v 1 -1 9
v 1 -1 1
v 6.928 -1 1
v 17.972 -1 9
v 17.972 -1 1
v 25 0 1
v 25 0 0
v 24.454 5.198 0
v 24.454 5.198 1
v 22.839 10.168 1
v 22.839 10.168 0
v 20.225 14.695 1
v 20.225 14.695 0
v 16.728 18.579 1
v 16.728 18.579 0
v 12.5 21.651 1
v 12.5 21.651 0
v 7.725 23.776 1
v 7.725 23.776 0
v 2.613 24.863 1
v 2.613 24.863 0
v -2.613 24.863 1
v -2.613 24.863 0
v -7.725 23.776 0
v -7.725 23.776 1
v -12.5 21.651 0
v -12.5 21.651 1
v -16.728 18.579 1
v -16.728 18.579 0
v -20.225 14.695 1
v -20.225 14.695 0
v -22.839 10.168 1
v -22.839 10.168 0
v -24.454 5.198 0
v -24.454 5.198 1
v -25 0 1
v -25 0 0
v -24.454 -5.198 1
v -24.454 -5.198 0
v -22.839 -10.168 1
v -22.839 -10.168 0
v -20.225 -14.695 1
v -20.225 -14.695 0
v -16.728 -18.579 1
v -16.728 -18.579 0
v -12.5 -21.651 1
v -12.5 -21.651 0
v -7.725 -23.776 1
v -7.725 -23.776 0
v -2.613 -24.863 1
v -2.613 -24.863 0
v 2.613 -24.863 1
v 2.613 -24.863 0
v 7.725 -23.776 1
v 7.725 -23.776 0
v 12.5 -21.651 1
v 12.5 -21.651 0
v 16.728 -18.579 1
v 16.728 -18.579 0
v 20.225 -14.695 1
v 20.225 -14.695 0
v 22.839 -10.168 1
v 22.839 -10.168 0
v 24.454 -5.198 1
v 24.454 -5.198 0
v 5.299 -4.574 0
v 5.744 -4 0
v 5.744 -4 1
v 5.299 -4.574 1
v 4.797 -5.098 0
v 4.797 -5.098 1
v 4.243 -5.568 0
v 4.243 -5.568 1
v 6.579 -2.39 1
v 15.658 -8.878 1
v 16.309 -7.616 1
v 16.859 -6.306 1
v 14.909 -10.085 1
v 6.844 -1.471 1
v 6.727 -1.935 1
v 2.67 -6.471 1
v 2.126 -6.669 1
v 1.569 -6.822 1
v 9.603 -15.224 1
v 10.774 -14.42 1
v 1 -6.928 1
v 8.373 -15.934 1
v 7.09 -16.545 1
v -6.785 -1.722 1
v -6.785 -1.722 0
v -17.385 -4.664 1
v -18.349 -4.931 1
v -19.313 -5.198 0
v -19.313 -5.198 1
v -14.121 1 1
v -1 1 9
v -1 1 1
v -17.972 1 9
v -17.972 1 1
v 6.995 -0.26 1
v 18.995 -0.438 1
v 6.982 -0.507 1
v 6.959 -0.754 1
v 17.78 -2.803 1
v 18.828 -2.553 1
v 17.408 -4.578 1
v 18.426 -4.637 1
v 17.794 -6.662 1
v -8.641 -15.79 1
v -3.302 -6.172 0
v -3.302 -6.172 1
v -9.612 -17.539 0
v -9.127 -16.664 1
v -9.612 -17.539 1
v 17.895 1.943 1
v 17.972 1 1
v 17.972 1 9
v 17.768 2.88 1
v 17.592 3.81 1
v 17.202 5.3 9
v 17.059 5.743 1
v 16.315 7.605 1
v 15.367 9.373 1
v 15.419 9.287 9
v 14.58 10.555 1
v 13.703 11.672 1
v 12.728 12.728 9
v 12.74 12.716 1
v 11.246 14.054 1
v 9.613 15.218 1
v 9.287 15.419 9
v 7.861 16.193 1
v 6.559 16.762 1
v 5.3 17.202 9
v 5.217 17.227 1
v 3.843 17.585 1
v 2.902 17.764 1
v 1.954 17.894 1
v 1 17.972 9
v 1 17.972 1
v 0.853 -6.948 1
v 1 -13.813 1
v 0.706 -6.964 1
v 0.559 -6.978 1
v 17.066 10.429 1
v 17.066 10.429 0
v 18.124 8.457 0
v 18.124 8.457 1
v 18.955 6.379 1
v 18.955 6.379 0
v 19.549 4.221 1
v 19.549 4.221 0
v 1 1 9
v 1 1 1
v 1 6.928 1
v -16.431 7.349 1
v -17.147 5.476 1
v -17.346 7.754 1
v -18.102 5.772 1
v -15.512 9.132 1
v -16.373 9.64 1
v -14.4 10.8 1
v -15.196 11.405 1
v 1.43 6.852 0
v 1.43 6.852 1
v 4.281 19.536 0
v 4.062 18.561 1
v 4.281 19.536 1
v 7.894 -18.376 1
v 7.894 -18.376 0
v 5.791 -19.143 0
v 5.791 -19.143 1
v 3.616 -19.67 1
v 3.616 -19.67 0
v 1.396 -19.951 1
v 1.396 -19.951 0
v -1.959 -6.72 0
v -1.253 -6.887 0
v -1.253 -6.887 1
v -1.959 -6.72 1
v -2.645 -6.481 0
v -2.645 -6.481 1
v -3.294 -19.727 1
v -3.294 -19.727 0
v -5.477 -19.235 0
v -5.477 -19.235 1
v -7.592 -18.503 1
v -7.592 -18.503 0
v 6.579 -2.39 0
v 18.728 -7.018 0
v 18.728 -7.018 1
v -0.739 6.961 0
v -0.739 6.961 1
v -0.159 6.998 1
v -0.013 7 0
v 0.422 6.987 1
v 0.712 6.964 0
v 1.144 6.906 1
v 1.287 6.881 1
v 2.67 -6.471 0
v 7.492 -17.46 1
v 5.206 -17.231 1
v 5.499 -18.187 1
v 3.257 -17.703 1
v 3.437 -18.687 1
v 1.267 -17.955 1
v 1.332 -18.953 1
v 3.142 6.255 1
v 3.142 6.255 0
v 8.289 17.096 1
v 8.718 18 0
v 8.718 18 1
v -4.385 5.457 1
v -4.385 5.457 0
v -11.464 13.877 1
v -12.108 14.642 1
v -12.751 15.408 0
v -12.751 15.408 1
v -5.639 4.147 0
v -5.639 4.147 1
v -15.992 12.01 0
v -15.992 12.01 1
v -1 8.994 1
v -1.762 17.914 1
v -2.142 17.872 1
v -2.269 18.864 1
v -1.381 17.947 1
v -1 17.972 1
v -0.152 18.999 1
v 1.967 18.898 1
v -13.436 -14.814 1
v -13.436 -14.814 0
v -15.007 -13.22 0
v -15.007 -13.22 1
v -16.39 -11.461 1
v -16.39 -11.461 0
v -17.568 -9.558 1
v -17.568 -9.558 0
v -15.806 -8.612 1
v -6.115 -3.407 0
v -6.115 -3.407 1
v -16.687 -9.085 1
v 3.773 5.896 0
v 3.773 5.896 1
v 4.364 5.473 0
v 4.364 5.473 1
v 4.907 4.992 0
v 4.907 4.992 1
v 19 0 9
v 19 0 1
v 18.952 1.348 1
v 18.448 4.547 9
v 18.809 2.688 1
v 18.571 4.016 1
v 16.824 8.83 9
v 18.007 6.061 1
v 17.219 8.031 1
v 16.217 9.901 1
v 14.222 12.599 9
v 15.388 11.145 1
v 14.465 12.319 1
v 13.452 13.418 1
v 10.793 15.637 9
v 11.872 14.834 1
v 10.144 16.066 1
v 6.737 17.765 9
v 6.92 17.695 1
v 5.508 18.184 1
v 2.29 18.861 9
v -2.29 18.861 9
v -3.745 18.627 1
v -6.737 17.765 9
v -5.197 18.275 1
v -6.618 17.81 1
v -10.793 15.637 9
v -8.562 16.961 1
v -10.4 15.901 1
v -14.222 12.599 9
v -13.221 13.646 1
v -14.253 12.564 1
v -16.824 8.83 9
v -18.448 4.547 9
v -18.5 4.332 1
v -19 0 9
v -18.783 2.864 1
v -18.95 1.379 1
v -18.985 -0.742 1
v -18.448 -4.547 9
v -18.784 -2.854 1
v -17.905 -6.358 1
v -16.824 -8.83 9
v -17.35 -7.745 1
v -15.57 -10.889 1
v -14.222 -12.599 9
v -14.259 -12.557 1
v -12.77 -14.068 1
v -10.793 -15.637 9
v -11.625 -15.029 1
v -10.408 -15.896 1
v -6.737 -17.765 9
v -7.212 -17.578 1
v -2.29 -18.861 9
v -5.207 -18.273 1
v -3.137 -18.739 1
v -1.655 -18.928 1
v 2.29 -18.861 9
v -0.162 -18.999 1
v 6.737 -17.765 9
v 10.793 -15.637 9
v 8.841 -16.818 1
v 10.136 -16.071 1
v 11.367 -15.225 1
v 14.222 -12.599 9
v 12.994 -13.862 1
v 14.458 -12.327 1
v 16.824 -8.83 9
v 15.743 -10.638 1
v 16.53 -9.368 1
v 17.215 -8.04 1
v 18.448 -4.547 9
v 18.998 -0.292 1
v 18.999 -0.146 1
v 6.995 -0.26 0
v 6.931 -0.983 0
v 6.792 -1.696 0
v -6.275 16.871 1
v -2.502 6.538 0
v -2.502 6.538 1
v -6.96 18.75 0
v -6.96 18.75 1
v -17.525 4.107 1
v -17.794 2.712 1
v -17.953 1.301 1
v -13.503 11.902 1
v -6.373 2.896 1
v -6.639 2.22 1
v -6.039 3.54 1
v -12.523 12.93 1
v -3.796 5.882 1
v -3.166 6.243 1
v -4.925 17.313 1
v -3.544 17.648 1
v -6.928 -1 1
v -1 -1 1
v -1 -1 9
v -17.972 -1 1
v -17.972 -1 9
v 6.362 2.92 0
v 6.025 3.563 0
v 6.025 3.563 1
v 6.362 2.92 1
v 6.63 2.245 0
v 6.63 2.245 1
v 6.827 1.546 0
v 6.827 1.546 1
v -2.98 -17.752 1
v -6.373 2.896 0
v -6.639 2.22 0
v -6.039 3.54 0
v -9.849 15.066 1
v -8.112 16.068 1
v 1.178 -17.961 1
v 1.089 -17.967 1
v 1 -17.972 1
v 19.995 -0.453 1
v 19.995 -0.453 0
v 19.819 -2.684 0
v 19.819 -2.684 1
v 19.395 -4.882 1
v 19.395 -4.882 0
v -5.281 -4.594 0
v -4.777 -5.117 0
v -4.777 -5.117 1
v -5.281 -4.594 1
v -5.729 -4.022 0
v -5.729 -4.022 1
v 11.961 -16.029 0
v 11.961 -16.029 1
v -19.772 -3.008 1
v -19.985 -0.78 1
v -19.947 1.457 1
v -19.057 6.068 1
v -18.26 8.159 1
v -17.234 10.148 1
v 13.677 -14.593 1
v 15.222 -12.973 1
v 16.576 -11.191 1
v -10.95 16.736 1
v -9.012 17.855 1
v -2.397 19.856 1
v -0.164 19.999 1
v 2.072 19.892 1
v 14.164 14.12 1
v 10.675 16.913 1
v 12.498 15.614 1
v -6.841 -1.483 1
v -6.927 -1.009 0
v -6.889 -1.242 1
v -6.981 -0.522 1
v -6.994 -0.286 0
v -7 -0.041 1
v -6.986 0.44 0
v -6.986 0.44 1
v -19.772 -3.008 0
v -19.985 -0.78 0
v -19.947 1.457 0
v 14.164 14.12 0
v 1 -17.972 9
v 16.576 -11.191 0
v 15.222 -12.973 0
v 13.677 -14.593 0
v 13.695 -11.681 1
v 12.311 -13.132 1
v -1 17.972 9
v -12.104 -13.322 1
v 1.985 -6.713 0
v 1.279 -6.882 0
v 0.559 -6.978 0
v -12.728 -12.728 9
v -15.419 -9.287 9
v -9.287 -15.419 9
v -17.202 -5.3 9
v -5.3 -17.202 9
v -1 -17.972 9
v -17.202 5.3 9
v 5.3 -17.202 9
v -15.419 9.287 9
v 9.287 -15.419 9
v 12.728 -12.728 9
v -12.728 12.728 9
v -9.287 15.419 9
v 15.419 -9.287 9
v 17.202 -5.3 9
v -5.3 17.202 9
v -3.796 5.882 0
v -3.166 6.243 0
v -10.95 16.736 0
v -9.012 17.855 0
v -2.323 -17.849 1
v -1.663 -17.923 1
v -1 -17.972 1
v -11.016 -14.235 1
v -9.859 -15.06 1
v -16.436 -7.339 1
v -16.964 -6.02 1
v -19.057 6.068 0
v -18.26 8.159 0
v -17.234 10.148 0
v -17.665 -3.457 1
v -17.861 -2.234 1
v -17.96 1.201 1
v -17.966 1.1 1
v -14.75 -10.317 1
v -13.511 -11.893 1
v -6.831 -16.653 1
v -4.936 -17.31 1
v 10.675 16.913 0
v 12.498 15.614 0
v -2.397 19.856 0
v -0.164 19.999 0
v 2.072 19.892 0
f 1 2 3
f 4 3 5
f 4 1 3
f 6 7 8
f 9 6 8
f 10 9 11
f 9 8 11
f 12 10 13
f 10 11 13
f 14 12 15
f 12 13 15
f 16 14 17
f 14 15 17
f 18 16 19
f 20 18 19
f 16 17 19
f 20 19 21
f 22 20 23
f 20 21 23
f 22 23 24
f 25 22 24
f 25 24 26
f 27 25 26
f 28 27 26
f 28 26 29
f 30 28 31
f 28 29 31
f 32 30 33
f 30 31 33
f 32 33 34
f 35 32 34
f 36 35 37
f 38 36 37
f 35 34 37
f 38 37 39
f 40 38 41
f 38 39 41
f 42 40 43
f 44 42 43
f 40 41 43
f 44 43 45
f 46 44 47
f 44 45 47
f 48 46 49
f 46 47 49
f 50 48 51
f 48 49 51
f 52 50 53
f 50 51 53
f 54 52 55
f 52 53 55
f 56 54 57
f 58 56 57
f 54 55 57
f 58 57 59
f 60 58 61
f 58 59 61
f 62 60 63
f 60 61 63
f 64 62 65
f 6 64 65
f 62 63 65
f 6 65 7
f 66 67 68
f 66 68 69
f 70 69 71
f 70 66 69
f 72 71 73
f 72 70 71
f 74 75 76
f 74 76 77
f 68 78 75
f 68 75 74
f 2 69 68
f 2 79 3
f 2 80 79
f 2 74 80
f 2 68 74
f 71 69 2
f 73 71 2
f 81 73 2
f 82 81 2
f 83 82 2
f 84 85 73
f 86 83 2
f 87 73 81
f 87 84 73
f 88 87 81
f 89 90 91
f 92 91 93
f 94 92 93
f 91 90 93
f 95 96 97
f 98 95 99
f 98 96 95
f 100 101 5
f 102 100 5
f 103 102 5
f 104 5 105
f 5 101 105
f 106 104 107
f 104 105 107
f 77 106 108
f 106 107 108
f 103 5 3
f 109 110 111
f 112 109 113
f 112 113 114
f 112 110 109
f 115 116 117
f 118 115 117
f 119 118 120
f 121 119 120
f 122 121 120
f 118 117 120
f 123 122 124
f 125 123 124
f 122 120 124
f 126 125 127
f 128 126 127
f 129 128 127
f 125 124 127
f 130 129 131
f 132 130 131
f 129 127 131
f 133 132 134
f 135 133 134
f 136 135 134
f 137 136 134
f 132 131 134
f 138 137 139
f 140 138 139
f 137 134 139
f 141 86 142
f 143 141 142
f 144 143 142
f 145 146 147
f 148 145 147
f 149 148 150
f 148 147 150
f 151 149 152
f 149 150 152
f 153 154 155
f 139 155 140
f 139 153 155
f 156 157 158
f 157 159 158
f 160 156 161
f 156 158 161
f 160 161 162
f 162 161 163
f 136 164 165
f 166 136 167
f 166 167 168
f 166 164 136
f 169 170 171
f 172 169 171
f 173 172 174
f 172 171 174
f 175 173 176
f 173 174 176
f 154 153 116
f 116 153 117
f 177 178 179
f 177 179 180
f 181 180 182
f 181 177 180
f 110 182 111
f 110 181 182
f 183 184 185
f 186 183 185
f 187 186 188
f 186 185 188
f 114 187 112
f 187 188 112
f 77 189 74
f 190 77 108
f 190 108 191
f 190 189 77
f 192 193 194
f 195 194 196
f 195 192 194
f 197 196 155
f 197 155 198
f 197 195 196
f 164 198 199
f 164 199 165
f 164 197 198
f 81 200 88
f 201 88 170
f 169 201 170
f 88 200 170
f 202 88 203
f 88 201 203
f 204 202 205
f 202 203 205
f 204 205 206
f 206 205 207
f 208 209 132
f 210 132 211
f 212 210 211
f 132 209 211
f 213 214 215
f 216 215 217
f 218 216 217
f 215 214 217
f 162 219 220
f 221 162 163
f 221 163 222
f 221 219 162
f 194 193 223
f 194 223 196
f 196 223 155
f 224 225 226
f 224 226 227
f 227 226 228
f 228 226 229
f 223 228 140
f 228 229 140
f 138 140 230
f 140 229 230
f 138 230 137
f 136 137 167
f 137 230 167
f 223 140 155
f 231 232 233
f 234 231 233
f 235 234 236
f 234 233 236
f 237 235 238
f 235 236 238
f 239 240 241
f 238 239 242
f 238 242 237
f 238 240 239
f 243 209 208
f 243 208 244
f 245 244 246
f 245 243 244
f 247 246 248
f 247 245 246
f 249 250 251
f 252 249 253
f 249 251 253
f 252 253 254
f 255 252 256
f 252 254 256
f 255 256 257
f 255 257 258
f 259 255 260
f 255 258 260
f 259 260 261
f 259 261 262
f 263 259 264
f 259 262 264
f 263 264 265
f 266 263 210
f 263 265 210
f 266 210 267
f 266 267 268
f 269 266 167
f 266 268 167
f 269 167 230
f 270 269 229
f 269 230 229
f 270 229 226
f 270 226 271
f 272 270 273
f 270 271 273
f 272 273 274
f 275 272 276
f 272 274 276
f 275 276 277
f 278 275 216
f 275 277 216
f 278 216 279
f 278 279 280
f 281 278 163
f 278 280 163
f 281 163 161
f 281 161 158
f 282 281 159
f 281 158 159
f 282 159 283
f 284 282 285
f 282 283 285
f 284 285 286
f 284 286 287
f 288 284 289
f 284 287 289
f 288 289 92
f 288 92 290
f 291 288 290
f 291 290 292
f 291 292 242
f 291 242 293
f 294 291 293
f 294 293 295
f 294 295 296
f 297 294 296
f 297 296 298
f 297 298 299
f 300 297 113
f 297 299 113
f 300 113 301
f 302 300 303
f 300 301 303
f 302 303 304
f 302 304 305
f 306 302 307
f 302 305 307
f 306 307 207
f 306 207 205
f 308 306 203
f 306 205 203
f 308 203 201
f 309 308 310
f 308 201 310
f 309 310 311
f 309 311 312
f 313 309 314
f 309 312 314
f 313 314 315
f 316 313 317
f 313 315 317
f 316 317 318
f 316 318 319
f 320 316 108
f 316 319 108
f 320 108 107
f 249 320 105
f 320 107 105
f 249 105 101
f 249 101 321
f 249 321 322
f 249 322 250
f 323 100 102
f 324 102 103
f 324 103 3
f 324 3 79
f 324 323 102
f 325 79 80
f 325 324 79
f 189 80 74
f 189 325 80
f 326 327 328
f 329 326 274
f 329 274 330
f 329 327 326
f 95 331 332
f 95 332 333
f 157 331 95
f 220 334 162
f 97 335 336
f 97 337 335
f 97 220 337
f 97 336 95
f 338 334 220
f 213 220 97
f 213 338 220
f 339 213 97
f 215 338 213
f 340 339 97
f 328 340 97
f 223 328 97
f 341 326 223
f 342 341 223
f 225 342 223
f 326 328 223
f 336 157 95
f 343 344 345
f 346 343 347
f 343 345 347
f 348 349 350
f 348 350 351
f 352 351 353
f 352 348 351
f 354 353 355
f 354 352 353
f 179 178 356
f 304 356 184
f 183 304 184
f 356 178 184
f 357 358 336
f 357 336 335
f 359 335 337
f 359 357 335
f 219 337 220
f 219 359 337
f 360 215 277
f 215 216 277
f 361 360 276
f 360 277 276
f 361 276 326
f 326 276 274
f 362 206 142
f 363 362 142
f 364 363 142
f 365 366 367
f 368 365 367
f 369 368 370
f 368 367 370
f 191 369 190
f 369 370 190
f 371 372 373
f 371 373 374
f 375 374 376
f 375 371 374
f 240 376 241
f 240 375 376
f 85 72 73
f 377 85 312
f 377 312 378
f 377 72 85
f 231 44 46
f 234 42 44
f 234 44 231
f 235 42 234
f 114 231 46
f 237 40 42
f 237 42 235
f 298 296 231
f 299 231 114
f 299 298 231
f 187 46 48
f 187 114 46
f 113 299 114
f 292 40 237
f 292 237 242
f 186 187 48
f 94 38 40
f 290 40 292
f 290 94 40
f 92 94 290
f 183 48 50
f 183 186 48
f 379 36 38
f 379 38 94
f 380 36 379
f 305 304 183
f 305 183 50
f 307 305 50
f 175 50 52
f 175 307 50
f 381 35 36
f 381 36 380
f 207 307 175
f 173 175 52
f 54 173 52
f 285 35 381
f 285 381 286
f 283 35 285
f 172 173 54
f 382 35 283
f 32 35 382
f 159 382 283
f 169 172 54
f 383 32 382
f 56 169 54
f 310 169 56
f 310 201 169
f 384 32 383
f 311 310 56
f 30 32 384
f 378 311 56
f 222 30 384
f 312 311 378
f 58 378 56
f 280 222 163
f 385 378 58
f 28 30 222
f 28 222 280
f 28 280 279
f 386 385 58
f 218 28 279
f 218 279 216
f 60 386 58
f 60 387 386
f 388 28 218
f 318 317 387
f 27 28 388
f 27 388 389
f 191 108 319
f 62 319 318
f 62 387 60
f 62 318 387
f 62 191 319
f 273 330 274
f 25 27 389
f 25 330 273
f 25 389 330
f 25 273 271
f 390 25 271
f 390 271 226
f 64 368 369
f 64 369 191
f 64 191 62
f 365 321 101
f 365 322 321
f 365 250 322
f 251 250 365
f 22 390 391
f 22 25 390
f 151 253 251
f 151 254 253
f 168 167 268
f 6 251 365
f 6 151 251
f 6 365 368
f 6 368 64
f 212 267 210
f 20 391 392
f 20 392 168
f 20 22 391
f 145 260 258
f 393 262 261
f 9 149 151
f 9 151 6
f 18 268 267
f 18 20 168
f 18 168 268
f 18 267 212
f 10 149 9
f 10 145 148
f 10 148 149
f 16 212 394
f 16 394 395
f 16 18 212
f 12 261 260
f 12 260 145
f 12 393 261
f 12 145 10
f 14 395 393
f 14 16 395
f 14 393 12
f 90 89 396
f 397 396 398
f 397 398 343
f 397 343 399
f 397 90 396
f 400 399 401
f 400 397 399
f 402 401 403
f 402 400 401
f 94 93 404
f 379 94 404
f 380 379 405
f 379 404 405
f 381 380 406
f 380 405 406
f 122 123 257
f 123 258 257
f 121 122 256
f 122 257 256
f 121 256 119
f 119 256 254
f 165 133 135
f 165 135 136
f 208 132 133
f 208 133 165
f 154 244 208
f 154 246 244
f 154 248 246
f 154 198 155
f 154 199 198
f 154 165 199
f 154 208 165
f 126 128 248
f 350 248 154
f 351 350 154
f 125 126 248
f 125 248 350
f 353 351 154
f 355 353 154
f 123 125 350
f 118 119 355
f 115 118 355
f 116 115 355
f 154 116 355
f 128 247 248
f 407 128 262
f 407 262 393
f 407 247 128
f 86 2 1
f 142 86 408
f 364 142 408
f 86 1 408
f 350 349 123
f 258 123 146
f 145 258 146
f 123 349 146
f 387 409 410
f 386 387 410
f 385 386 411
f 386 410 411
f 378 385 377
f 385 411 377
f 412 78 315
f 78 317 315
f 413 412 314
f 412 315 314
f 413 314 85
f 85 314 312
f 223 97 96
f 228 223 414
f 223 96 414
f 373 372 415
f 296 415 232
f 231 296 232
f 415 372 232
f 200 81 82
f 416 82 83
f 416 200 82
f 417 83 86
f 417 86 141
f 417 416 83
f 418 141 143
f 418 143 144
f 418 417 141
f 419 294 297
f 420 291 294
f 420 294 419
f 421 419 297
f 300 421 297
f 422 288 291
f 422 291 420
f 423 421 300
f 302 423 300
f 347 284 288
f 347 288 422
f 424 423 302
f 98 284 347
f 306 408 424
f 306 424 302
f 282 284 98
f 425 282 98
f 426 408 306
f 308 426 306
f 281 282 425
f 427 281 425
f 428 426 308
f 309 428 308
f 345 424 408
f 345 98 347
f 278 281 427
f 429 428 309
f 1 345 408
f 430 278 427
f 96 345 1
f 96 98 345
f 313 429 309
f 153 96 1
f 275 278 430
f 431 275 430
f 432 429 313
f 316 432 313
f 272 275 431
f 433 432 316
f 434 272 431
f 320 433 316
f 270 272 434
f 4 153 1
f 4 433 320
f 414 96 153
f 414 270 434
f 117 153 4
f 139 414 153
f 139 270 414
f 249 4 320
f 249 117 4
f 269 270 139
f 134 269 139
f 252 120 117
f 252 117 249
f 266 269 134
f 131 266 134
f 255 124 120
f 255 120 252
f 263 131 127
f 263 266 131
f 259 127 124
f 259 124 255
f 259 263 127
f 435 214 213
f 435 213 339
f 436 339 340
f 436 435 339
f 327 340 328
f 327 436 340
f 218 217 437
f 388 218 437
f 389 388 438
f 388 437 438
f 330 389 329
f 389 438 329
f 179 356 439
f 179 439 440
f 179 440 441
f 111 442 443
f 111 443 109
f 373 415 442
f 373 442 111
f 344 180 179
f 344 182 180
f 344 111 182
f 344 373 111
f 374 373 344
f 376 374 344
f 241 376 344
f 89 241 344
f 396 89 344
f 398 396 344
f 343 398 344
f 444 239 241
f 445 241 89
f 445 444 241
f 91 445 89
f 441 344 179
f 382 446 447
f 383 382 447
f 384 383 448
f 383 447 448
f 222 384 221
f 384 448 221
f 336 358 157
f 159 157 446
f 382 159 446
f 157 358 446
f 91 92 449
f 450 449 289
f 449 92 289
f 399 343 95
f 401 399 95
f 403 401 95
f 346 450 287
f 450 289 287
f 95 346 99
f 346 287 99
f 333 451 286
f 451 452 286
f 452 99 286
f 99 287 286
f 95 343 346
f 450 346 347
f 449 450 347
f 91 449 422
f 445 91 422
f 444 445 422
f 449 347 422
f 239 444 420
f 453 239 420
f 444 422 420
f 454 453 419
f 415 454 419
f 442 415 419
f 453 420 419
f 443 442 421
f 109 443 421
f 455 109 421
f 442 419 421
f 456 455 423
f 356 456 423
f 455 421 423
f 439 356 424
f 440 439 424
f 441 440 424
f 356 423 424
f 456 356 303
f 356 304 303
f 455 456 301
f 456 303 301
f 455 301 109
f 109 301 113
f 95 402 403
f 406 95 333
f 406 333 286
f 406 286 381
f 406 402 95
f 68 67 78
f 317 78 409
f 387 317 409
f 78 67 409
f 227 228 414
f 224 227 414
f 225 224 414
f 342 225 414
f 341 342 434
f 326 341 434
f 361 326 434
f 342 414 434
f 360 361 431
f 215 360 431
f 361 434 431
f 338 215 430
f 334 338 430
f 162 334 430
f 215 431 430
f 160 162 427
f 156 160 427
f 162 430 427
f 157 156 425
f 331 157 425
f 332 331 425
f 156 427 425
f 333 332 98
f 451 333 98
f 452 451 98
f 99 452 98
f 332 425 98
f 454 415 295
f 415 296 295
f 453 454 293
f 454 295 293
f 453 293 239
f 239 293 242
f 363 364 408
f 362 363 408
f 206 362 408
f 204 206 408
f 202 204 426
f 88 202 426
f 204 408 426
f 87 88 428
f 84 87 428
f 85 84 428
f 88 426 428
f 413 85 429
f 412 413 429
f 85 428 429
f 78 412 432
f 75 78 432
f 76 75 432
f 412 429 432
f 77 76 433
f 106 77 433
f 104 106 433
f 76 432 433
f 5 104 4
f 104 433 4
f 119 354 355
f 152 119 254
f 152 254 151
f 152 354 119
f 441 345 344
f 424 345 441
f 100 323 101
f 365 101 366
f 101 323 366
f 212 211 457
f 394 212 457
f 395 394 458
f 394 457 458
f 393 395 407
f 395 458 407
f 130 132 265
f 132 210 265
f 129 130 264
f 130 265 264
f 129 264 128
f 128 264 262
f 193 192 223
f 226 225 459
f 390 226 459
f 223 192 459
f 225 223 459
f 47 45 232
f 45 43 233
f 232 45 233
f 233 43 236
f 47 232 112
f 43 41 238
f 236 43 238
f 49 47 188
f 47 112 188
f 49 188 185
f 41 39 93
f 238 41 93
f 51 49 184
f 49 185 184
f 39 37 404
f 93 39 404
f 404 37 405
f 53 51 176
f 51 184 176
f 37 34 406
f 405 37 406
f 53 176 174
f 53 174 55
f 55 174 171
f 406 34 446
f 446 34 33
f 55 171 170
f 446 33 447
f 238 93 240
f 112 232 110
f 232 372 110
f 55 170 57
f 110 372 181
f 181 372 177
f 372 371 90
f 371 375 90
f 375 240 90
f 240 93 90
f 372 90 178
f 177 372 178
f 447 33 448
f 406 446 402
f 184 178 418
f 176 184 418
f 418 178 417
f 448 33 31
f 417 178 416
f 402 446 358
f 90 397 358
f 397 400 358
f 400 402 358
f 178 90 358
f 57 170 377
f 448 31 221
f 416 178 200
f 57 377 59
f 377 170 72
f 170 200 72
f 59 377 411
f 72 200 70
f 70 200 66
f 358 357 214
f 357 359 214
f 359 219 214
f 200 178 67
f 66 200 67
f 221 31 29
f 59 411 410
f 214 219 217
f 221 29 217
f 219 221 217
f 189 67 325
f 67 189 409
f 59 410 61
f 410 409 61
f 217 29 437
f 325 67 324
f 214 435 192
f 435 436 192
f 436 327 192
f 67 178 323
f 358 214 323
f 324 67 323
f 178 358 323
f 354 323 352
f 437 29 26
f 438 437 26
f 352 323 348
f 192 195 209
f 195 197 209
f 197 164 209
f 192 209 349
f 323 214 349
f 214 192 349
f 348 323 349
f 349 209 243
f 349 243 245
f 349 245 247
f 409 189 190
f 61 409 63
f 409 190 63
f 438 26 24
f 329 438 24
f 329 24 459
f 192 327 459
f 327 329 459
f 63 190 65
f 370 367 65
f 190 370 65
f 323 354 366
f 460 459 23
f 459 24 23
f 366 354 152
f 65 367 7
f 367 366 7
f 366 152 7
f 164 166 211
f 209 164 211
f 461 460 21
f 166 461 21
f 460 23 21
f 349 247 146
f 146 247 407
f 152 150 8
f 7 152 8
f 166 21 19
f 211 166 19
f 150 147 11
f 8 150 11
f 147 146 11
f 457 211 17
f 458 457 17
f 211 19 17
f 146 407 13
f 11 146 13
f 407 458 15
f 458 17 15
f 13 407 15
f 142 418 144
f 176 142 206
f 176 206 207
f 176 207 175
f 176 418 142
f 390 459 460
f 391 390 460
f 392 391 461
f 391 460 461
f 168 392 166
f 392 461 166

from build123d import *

# Parameters (mm, degrees)
SKETCH_R              = 25
PAD_DEPTH             = 1
SKETCH001_R           = 19
PAD001_DEPTH          = 8
POCKET_DEPTH          = 8
POLARPATTERN_COUNT    = 4
POCKET001_DEPTH       = 1
POLARPATTERN001_COUNT = 11


with BuildPart() as part:
    # Sketch → Pad (new body)
    with BuildSketch(Plane.XY):
        Circle(SKETCH_R)
    extrude(amount=PAD_DEPTH)

    # Sketch001 (on Face3 of Pad) → Pad001 (join)
    with BuildSketch(Plane.XY.offset(1)):
        Circle(SKETCH001_R)
    extrude(amount=PAD001_DEPTH)

    # Sketch002 (on Face5 of Pad001) → Pocket (cut)
    with BuildSketch(Plane.XY.offset(9)):
        with BuildLine():
            ThreePointArc((-1, 17.972201), (-12.727922, 12.727922), (-17.972201, 1))
            Line((-1, 1), (-17.972201, 1))
            Line((-1, 1), (-1, 17.972201))
        make_face()
    pocket = extrude(amount=-POCKET_DEPTH, mode=Mode.SUBTRACT)

    # PolarPattern: Pocket ×4 about axis
    polarpattern_axis = Axis((0, 0, 9), (0, 0, 1))
    for i in range(1, POLARPATTERN_COUNT):
        add(pocket.rotate(polarpattern_axis, i * 360 / POLARPATTERN_COUNT), mode=Mode.SUBTRACT)

    # Sketch003 (on Face2 of PolarPattern) → Pocket001 (cut)
    with BuildSketch(Plane(origin=(0, 0, 0), x_dir=(1, 0, 0), z_dir=(0, 0, -1))):
        with BuildLine():
            Line((0.558896, 6.977653), (1.396138, 19.95121))
            ThreePointArc((7.893916, 18.376237), (4.711307, 19.43717), (1.396138, 19.95121))
            Line((2.669717, 6.470905), (7.893916, 18.376237))
            ThreePointArc((2.669717, 6.470905), (1.63407, 6.806601), (0.558896, 6.977653))
        make_face()
    pocket001 = extrude(amount=-POCKET001_DEPTH, mode=Mode.SUBTRACT)

    # PolarPattern001: Pocket001 ×11 about axis
    polarpattern001_axis = Axis((0, 0, 0), (0, 0, -1))
    for i in range(1, POLARPATTERN001_COUNT):
        add(pocket001.rotate(polarpattern001_axis, i * 360 / POLARPATTERN001_COUNT), mode=Mode.SUBTRACT)


solid = part.part
